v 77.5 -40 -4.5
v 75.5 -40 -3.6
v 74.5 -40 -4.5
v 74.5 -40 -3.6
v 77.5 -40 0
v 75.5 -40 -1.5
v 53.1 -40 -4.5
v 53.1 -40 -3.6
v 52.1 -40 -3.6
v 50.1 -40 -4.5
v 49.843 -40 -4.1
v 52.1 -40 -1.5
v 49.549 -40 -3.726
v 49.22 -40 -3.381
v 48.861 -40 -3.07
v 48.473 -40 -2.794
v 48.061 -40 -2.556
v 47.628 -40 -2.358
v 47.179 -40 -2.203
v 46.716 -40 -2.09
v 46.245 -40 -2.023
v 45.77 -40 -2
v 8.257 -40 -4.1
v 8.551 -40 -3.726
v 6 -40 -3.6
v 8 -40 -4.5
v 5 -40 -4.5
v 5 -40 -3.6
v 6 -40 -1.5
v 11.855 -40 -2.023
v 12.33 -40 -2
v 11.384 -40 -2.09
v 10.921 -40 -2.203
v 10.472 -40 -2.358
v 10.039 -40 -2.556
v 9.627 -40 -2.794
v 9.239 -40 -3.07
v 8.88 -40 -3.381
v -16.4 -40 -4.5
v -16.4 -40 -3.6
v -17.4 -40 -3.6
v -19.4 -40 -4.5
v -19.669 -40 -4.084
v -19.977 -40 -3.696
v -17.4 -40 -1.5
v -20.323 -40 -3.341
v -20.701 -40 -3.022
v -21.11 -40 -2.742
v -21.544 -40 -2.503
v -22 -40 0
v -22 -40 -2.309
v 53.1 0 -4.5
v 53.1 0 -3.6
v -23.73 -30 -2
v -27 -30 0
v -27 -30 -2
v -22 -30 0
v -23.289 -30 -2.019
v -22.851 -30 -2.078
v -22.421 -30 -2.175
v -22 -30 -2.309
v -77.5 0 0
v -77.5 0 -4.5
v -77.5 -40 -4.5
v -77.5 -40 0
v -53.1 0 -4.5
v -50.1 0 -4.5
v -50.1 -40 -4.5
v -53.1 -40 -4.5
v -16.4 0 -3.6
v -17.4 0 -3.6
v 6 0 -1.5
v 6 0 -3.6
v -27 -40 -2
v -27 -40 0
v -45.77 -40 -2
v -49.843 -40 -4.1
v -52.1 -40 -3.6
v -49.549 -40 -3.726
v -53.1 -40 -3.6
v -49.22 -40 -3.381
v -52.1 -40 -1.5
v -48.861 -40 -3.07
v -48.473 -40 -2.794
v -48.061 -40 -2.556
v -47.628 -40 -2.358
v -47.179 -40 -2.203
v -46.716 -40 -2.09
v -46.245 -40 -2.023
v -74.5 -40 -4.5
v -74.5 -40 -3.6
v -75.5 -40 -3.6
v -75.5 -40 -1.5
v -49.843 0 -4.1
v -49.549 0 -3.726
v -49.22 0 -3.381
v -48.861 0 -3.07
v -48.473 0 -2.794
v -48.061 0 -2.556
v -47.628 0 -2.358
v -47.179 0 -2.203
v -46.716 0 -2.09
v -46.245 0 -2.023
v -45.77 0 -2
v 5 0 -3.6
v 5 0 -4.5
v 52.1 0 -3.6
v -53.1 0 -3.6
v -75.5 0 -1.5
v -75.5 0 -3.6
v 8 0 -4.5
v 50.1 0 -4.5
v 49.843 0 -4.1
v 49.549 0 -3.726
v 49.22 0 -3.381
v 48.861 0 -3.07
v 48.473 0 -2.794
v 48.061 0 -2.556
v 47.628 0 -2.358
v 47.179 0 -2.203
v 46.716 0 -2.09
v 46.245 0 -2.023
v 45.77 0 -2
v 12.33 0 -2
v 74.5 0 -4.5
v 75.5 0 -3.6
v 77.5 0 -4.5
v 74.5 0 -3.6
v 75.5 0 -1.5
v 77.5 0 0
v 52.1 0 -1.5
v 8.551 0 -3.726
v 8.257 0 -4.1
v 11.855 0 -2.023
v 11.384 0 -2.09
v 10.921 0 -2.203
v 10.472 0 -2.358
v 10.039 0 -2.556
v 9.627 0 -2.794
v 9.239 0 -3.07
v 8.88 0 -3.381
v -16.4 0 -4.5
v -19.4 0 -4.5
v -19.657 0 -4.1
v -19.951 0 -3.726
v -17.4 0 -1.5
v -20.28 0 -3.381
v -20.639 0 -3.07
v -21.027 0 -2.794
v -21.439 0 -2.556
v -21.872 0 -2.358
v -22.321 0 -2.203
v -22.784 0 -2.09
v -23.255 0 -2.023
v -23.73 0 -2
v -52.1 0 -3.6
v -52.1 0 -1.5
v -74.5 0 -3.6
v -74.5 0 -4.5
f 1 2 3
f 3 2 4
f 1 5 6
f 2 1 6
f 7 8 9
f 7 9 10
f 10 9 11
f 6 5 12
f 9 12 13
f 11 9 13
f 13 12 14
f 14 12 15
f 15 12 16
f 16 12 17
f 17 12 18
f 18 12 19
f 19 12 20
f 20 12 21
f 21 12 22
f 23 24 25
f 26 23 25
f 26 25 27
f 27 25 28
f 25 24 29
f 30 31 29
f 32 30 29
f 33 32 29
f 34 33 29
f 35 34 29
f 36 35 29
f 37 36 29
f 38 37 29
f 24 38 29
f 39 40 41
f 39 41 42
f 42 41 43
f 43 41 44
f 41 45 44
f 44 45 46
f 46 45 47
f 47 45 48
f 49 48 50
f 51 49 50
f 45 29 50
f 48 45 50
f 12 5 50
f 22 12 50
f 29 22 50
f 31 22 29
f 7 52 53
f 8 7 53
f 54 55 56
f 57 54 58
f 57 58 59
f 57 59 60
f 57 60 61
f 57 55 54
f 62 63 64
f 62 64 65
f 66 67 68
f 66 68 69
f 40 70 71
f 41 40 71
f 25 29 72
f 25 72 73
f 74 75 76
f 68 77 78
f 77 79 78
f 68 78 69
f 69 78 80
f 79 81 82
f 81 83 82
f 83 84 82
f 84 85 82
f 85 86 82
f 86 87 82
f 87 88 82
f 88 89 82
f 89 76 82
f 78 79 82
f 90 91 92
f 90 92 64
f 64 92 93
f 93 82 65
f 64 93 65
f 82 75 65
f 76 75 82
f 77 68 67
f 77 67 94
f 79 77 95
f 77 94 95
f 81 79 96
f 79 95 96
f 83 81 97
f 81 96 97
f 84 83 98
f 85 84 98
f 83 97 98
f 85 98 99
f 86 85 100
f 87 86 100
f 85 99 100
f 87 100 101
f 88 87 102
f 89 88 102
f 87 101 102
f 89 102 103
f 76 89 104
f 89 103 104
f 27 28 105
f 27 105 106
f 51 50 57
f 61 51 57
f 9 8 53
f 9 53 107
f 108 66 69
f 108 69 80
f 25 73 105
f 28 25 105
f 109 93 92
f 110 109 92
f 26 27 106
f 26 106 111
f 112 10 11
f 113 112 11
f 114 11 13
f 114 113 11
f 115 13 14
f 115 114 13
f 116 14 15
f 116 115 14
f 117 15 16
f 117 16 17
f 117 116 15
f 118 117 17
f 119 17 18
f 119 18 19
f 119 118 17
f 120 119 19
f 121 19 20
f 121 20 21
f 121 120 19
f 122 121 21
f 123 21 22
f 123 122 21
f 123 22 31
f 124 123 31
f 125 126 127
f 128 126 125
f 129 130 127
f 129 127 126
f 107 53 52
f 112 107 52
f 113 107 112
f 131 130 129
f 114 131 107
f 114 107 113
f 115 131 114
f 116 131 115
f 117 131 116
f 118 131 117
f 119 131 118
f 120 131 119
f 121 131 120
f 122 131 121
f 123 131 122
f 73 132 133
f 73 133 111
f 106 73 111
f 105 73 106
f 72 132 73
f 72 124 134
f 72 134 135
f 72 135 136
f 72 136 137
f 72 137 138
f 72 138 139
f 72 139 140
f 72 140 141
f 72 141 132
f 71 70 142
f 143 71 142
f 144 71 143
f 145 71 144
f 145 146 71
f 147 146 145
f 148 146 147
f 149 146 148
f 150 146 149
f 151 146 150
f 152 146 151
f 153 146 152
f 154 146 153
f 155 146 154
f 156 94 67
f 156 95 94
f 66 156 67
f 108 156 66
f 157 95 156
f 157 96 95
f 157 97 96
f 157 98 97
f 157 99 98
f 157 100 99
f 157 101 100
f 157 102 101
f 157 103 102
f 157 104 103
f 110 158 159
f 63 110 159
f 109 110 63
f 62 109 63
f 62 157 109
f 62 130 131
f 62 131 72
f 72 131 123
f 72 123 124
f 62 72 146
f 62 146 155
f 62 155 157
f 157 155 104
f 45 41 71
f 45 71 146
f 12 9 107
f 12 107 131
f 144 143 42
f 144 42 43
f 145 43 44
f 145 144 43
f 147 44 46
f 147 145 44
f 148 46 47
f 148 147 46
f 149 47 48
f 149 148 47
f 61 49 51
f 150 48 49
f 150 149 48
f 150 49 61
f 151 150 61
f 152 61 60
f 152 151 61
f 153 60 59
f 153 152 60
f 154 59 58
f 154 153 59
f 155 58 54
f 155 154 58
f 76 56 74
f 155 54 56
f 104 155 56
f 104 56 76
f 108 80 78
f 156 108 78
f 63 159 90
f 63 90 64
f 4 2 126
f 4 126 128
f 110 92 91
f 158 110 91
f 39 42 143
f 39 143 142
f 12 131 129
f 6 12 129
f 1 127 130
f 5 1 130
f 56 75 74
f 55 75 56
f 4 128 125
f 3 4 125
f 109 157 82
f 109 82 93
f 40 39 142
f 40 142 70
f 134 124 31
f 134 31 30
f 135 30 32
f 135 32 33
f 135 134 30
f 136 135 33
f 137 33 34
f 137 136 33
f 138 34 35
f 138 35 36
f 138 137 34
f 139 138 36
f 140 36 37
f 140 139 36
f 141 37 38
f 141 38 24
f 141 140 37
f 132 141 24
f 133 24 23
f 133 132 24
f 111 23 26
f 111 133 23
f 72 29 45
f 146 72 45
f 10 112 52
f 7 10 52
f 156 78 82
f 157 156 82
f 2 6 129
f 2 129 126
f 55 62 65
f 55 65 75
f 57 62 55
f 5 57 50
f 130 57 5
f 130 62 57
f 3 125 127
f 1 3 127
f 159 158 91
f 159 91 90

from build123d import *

# Parameters (mm, degrees)
F1_DEPTH       = 40
F2_T1_DEPTH    = 40
F5_DEPTH       = 40
F6_W           = 23.4
F6_H           = 0.5
F7_DEPTH       = 40.001
F8_T1_DEPTH    = 40
F9_W           = 5
F9_H           = 10
F10_DEPTH      = 181
F10_DEPTH_BACK = 4.501


# Not quite as in the source:
# - a fillet or chamfer that OpenCascade refuses, or shapes differently, is made with other operations: its cross-section is extruded or revolved along the edge and cut away or added
# - an extrude ends at something that could not be found from the text; its depth is read off the source's solid


with BuildPart() as f1:
    # F0 (on Front) → F1 (new body)
    with BuildSketch(Plane.XZ):
        Polygon((77.5, 0), (0, 0), (0, -2), (50.1, -2), (50.1, -4.5), (53.1, -4.5), (53.1, -3.6), (52.1, -3.6), (52.1, -2), (52.1, -1.5), (75.5, -1.5), (75.5, -2), (75.5, -3.6), (74.5, -3.6), (74.5, -4.5), (77.5, -4.5), (77.5, -2), align=None)
    extrude(amount=F1_DEPTH)

    # F2: fillet of radius 5 on 1 edges, made by hand

    # F2_s2 → F2_t1 (join)
    with BuildSketch(Plane.XZ):
        with BuildLine():
            ThreePointArc((50.1, -4.5), (48.2698729811, -2.6698729811), (45.7698729811, -2))
            Line((45.7698729811, -2), (50.1, -2))
            Line((50.1, -2), (50.1, -4.5))
        make_face()
    extrude(amount=F2_T1_DEPTH)

    # F3: F1 across plane


with BuildPart() as f1_1:
    add(f1.part)
    add(f1.part.mirror(Plane.YZ))

    # F4 (on face) → F5 (join, through all)
    with BuildSketch(Plane.XZ.offset(40)):
        Polygon((-17.4, -3.6), (-17.4, -2), (-19.4, -2), (-19.4, -4.5), (-17.4, -4.5), (-16.4, -4.5), (-16.4, -3.6), align=None)
        Polygon((8, -2), (6, -2), (6, -3.6), (5, -3.6), (5, -4.5), (6, -4.5), (8, -4.5), align=None)
    extrude(amount=-F5_DEPTH)

    # F6 (on face) → F7 (cut, through all)
    with BuildSketch(Plane(origin=(0, 0, 0), x_dir=(-1, 0, 0), z_dir=(0, 1, 0))):
        with Locations((5.7, -1.75)):
            Rectangle(F6_W, F6_H)
    extrude(amount=-F7_DEPTH, mode=Mode.SUBTRACT)

    # F8: fillet of radius 5 on 2 edges, made by hand

    # F8_s2 → F8_t1 (join)
    with BuildSketch(Plane.XZ):
        with BuildLine():
            ThreePointArc((-19.4, -4.5), (-21.2301270189, -2.6698729811), (-23.7301270189, -2))
            Line((-23.7301270189, -2), (-19.4, -2))
            Line((-19.4, -2), (-19.4, -4.5))
        make_face()
        with BuildLine():
            ThreePointArc((12.3301270189, -2), (9.8301270189, -2.6698729811), (8, -4.5))
            Line((8, -4.5), (8, -2))
            Line((8, -2), (12.3301270189, -2))
        make_face()
    extrude(amount=F8_T1_DEPTH)

    # F9 (on Top) → F10 (cut, two sides)
    with BuildSketch(Plane.XY) as f10_sk:
        with Locations((-24.5, -35)):
            Rectangle(F9_W, F9_H)
    extrude(amount=F10_DEPTH, mode=Mode.SUBTRACT)
    extrude(f10_sk.sketch, amount=-F10_DEPTH_BACK, mode=Mode.SUBTRACT)


solid = f1_1.part
